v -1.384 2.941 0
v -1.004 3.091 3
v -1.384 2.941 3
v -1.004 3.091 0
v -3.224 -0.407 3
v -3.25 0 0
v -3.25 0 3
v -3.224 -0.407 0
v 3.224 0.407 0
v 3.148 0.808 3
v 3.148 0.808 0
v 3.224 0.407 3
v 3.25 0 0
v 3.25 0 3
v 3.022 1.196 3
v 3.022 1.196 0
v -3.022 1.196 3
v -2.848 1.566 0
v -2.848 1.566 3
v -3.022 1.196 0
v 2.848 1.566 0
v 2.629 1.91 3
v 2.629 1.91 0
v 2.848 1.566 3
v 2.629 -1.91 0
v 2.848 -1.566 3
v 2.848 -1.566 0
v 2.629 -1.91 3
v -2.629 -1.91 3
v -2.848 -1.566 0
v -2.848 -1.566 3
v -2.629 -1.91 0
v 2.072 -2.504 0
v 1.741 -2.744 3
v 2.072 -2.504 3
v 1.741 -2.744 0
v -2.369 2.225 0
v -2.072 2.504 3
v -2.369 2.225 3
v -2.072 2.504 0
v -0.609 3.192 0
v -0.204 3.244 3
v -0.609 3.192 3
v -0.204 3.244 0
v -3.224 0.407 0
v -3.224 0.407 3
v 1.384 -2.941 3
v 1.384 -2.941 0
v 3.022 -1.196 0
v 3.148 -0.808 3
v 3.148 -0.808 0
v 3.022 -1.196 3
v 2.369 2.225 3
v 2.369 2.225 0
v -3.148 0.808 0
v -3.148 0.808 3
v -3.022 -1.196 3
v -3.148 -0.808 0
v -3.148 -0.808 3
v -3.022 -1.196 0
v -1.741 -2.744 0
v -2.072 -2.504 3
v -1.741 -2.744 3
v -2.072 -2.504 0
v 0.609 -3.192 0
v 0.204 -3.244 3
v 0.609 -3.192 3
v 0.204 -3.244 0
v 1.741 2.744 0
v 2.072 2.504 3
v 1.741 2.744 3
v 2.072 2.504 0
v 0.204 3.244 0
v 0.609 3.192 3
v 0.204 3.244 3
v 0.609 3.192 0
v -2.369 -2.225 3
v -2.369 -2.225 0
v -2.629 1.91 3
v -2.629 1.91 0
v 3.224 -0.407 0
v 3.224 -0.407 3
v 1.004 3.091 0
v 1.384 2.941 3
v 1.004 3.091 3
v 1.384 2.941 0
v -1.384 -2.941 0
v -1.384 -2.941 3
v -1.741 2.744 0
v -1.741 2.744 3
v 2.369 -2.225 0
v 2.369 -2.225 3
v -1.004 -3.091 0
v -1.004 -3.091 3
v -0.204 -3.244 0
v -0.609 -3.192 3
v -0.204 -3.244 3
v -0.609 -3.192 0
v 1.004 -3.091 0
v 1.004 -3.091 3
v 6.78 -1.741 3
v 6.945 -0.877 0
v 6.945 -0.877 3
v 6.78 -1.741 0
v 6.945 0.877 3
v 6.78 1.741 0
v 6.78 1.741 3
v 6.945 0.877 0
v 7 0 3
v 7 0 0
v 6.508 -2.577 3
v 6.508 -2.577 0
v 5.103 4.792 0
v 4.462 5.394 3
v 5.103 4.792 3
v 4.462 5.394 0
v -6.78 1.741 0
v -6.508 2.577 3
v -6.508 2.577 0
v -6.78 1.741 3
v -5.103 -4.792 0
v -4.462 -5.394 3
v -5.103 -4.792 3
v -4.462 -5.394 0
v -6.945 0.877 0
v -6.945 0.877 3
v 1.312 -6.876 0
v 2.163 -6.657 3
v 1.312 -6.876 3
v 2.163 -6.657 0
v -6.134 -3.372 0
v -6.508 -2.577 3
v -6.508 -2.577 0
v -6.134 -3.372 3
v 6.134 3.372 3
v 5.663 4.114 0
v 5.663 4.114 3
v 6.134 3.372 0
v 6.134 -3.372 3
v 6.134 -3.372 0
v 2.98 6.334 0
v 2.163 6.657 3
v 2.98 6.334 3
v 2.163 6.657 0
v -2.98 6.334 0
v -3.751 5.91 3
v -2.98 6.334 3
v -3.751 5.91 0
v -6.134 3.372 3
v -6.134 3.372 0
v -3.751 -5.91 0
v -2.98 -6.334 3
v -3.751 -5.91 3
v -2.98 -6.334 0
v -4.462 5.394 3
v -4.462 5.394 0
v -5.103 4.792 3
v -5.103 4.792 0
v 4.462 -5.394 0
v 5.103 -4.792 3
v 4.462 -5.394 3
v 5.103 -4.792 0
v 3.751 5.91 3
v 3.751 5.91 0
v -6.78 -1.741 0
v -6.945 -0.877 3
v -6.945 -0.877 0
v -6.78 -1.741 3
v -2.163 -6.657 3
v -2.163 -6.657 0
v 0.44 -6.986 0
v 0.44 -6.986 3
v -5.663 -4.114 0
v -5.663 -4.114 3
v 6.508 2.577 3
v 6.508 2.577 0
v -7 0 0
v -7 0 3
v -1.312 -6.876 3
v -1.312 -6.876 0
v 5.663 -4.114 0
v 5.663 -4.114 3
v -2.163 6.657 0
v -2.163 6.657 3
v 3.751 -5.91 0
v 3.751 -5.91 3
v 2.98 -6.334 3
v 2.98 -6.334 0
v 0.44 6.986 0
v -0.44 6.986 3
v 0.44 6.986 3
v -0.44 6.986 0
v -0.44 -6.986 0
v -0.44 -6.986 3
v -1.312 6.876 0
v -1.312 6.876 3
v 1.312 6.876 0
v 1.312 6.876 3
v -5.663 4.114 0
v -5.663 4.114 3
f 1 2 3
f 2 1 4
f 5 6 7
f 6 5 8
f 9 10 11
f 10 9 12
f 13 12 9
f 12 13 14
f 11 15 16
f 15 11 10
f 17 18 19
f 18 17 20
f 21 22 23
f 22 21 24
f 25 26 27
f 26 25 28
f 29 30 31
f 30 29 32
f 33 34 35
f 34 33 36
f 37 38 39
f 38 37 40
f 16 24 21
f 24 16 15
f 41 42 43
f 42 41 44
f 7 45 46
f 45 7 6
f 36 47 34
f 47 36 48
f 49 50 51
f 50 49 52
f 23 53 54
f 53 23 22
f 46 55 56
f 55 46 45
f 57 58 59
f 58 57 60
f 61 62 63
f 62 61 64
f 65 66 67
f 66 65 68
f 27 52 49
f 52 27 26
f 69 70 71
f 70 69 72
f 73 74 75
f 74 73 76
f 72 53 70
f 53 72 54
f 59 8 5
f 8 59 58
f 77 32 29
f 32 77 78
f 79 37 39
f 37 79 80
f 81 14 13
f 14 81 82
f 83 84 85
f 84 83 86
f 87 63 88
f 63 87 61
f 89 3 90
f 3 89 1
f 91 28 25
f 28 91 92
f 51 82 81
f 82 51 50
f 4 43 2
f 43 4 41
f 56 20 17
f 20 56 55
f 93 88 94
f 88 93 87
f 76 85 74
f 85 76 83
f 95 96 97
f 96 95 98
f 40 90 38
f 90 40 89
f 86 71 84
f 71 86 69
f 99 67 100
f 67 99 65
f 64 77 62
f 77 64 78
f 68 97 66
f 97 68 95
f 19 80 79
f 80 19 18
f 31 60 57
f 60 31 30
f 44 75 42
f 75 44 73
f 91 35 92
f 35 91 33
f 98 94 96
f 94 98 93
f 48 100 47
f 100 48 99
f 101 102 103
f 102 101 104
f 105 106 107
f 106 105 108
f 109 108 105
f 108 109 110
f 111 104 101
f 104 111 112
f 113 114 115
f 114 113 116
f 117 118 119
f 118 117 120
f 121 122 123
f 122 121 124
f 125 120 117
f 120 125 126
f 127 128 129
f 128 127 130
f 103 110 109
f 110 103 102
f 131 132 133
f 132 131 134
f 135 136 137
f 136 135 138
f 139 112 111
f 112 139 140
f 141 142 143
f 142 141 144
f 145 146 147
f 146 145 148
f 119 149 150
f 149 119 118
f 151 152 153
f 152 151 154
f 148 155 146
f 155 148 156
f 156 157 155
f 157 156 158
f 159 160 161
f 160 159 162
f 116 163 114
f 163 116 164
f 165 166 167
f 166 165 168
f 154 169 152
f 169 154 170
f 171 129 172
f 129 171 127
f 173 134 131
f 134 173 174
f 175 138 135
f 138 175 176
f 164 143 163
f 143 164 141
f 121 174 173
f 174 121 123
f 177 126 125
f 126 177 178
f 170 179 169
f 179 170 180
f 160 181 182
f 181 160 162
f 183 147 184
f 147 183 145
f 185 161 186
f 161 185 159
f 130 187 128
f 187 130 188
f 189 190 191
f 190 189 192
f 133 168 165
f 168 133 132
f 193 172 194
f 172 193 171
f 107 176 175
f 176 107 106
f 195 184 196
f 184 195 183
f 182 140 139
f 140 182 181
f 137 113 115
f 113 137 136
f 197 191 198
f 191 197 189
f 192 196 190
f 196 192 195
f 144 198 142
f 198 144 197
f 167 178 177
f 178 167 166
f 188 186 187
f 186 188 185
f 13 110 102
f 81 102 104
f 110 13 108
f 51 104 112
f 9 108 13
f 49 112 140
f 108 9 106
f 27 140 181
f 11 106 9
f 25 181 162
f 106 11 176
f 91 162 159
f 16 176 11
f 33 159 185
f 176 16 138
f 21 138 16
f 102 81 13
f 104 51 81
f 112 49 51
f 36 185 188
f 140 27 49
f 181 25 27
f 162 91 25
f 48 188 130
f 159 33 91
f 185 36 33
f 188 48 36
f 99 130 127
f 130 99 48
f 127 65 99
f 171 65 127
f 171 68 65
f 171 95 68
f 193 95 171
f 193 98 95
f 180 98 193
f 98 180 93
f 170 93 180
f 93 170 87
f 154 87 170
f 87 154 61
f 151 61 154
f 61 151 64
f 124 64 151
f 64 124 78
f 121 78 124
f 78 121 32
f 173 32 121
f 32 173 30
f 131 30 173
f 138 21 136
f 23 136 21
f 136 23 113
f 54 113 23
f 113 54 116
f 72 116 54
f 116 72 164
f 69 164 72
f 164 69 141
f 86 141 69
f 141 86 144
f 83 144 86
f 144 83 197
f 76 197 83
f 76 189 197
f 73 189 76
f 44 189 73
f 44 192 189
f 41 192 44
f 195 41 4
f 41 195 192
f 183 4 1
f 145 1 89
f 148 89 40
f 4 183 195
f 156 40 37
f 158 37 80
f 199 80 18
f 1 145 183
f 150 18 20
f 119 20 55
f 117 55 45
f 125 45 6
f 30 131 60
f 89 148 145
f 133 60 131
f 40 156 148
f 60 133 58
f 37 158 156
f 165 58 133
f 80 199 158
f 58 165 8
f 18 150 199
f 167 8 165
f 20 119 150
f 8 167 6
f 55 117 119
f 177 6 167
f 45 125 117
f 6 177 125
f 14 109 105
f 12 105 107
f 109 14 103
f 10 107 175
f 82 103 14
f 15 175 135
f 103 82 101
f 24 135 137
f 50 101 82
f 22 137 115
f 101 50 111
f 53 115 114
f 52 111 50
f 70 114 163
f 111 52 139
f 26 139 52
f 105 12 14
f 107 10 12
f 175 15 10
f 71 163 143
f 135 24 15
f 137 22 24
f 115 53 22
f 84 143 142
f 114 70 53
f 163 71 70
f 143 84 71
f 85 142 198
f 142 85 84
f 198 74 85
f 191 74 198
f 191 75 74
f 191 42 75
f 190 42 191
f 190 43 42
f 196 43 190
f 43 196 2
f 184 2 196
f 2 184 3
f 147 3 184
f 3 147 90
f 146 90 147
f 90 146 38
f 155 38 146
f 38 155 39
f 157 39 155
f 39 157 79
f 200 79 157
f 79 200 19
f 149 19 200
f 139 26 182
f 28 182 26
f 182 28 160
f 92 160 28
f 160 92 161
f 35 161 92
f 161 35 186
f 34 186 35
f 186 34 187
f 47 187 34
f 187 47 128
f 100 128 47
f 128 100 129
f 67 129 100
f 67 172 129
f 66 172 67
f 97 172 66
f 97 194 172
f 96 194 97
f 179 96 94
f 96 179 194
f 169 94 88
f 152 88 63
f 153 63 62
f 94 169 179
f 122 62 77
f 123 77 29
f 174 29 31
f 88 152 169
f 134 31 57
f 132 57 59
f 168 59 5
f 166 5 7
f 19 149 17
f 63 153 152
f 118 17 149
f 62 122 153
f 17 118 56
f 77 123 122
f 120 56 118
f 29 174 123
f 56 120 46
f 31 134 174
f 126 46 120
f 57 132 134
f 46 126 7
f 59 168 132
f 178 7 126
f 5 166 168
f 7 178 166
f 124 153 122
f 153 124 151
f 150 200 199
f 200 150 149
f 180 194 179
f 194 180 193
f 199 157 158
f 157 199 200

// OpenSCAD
$fn = 50;


difference() {
	union() {
		*color(alpha = 1.0000000000, c = "gray") {
			translate(v = [0, 7, 0]) {
				linear_extrude(height = 1) {
					text(font = "Arial:style=Bold", halign = "center", size = 4.5000000000, text = "COMMENT plate main", valign = "center");
				}
			}
		}
		cylinder(h = 3, r = 7.0000000000);
	}
	union() {
		*color(alpha = 1.0000000000, c = "gray") {
			translate(v = [0, 7, 0]) {
				linear_extrude(height = 1) {
					text(font = "Arial:style=Bold", halign = "center", size = 4.5000000000, text = "COMMENT holes main", valign = "center");
				}
			}
		}
		translate(v = [0, 0, -100]) {
			cylinder(h = 200, r = 3.2500000000);
		}
		translate(v = [0, 0, -100]) {
			cylinder(h = 200, r = 1.8000000000);
		}
	}
}
